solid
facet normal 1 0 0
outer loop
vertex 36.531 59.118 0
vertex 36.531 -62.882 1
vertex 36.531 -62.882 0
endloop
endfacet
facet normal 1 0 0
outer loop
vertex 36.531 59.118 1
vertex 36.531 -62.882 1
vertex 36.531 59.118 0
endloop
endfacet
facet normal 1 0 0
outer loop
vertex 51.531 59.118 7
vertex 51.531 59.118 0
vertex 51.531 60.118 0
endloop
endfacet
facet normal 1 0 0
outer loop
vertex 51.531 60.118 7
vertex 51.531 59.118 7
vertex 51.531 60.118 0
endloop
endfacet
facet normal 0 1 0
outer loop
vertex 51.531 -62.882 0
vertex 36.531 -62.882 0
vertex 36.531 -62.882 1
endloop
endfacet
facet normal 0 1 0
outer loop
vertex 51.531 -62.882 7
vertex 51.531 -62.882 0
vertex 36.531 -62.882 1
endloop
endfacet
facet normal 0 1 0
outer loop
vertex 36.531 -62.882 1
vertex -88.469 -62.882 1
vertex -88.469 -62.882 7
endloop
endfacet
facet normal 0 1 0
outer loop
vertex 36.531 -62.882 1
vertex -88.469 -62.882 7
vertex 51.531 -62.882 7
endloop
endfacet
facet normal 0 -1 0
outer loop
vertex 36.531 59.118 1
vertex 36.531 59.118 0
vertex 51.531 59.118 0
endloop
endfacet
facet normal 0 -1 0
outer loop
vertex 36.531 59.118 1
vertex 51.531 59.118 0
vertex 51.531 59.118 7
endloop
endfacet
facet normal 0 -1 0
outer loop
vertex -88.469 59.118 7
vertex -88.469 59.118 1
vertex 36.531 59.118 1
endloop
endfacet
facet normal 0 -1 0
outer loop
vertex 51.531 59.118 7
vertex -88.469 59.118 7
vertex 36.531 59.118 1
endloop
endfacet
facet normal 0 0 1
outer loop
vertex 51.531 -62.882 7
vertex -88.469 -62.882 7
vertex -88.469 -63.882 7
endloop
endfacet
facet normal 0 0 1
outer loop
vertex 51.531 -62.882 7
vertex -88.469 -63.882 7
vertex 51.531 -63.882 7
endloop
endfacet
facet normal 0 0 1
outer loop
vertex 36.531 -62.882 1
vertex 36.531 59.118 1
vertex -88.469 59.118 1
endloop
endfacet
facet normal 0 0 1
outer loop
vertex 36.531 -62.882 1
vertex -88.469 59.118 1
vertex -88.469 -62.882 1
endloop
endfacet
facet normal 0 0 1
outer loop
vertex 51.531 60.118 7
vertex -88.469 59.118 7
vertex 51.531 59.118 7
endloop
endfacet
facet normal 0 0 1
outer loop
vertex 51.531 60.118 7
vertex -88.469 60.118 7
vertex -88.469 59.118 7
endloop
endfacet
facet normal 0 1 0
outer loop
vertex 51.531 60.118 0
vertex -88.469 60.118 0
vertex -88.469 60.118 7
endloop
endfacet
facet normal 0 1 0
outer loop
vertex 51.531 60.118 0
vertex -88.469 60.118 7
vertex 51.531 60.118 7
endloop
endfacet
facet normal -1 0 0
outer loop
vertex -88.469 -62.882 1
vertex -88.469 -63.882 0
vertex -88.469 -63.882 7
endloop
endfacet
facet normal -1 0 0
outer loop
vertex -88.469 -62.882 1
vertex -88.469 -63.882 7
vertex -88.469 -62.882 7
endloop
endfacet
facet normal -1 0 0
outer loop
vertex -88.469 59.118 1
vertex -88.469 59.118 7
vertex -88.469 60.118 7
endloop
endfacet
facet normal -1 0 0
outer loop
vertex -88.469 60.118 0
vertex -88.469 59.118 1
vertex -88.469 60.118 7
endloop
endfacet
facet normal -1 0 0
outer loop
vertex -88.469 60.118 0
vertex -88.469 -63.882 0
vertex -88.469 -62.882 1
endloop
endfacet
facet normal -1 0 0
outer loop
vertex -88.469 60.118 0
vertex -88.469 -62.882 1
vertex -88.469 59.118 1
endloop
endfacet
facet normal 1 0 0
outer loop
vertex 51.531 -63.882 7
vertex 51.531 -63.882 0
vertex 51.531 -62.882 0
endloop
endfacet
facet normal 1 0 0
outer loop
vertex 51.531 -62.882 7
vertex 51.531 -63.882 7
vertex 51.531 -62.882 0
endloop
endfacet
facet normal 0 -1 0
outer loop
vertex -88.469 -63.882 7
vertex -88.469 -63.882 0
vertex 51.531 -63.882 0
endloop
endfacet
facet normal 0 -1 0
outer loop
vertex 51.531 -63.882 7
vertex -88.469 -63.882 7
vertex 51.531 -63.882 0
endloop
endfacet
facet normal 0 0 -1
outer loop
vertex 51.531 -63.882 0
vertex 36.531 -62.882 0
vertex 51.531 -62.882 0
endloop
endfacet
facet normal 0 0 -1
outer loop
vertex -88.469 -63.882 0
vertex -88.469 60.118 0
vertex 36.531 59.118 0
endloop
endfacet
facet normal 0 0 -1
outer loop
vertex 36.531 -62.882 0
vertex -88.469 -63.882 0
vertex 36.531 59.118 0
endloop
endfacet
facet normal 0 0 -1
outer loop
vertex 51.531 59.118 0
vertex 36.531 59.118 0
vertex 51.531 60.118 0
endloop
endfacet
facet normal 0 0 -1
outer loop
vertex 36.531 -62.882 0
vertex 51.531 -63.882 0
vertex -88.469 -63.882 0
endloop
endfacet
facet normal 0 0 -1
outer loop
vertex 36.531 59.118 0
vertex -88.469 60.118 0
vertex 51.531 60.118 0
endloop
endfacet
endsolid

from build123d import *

# Parameters (mm, degrees)
F0_W     = 140
F0_H     = 124
F1_DEPTH = 7
F2_T     = -1
F3_W     = 122
F3_H     = 6
F4_DEPTH = 1
F5_W     = 122
F5_H     = 6
F6_DEPTH = 1
F7_W     = 15
F7_H     = 122
F8_DEPTH = 1


with BuildPart() as f1:
    # F0 (on Top) → F1 (new body)
    with BuildSketch(Plane.XY):
        with Locations((-18.4690234582, -1.8815491349)):
            Rectangle(F0_W, F0_H)
    extrude(amount=F1_DEPTH)

    # F2
    f2_openings = [f1.faces().sort_by_distance(p)[0] for p in [
        (-18.469023, -1.881549, 7),
    ]]
    offset(amount=F2_T, openings=f2_openings)

    # F3 (on face) → F4 (cut)
    with BuildSketch(Plane(origin=(-88.4690234582, 0, 0), x_dir=(0, -1, 0), z_dir=(-1, 0, 0))):
        with Locations((1.8815491349, 4)):
            Rectangle(F3_W, F3_H)
    extrude(amount=-F4_DEPTH, mode=Mode.SUBTRACT)

    # F5 (on face) → F6 (cut)
    with BuildSketch(Plane.YZ.offset(51.5309765418)):
        with Locations((-1.8815491349, 4)):
            Rectangle(F5_W, F5_H)
    extrude(amount=-F6_DEPTH, mode=Mode.SUBTRACT)

    # F7 (on face) → F8 (cut)
    with BuildSketch(Plane.XY.offset(1)):
        with Locations((44.0309765418, -1.8815491349)):
            Rectangle(F7_W, F7_H)
    extrude(amount=-F8_DEPTH, mode=Mode.SUBTRACT)


solid = f1.part
